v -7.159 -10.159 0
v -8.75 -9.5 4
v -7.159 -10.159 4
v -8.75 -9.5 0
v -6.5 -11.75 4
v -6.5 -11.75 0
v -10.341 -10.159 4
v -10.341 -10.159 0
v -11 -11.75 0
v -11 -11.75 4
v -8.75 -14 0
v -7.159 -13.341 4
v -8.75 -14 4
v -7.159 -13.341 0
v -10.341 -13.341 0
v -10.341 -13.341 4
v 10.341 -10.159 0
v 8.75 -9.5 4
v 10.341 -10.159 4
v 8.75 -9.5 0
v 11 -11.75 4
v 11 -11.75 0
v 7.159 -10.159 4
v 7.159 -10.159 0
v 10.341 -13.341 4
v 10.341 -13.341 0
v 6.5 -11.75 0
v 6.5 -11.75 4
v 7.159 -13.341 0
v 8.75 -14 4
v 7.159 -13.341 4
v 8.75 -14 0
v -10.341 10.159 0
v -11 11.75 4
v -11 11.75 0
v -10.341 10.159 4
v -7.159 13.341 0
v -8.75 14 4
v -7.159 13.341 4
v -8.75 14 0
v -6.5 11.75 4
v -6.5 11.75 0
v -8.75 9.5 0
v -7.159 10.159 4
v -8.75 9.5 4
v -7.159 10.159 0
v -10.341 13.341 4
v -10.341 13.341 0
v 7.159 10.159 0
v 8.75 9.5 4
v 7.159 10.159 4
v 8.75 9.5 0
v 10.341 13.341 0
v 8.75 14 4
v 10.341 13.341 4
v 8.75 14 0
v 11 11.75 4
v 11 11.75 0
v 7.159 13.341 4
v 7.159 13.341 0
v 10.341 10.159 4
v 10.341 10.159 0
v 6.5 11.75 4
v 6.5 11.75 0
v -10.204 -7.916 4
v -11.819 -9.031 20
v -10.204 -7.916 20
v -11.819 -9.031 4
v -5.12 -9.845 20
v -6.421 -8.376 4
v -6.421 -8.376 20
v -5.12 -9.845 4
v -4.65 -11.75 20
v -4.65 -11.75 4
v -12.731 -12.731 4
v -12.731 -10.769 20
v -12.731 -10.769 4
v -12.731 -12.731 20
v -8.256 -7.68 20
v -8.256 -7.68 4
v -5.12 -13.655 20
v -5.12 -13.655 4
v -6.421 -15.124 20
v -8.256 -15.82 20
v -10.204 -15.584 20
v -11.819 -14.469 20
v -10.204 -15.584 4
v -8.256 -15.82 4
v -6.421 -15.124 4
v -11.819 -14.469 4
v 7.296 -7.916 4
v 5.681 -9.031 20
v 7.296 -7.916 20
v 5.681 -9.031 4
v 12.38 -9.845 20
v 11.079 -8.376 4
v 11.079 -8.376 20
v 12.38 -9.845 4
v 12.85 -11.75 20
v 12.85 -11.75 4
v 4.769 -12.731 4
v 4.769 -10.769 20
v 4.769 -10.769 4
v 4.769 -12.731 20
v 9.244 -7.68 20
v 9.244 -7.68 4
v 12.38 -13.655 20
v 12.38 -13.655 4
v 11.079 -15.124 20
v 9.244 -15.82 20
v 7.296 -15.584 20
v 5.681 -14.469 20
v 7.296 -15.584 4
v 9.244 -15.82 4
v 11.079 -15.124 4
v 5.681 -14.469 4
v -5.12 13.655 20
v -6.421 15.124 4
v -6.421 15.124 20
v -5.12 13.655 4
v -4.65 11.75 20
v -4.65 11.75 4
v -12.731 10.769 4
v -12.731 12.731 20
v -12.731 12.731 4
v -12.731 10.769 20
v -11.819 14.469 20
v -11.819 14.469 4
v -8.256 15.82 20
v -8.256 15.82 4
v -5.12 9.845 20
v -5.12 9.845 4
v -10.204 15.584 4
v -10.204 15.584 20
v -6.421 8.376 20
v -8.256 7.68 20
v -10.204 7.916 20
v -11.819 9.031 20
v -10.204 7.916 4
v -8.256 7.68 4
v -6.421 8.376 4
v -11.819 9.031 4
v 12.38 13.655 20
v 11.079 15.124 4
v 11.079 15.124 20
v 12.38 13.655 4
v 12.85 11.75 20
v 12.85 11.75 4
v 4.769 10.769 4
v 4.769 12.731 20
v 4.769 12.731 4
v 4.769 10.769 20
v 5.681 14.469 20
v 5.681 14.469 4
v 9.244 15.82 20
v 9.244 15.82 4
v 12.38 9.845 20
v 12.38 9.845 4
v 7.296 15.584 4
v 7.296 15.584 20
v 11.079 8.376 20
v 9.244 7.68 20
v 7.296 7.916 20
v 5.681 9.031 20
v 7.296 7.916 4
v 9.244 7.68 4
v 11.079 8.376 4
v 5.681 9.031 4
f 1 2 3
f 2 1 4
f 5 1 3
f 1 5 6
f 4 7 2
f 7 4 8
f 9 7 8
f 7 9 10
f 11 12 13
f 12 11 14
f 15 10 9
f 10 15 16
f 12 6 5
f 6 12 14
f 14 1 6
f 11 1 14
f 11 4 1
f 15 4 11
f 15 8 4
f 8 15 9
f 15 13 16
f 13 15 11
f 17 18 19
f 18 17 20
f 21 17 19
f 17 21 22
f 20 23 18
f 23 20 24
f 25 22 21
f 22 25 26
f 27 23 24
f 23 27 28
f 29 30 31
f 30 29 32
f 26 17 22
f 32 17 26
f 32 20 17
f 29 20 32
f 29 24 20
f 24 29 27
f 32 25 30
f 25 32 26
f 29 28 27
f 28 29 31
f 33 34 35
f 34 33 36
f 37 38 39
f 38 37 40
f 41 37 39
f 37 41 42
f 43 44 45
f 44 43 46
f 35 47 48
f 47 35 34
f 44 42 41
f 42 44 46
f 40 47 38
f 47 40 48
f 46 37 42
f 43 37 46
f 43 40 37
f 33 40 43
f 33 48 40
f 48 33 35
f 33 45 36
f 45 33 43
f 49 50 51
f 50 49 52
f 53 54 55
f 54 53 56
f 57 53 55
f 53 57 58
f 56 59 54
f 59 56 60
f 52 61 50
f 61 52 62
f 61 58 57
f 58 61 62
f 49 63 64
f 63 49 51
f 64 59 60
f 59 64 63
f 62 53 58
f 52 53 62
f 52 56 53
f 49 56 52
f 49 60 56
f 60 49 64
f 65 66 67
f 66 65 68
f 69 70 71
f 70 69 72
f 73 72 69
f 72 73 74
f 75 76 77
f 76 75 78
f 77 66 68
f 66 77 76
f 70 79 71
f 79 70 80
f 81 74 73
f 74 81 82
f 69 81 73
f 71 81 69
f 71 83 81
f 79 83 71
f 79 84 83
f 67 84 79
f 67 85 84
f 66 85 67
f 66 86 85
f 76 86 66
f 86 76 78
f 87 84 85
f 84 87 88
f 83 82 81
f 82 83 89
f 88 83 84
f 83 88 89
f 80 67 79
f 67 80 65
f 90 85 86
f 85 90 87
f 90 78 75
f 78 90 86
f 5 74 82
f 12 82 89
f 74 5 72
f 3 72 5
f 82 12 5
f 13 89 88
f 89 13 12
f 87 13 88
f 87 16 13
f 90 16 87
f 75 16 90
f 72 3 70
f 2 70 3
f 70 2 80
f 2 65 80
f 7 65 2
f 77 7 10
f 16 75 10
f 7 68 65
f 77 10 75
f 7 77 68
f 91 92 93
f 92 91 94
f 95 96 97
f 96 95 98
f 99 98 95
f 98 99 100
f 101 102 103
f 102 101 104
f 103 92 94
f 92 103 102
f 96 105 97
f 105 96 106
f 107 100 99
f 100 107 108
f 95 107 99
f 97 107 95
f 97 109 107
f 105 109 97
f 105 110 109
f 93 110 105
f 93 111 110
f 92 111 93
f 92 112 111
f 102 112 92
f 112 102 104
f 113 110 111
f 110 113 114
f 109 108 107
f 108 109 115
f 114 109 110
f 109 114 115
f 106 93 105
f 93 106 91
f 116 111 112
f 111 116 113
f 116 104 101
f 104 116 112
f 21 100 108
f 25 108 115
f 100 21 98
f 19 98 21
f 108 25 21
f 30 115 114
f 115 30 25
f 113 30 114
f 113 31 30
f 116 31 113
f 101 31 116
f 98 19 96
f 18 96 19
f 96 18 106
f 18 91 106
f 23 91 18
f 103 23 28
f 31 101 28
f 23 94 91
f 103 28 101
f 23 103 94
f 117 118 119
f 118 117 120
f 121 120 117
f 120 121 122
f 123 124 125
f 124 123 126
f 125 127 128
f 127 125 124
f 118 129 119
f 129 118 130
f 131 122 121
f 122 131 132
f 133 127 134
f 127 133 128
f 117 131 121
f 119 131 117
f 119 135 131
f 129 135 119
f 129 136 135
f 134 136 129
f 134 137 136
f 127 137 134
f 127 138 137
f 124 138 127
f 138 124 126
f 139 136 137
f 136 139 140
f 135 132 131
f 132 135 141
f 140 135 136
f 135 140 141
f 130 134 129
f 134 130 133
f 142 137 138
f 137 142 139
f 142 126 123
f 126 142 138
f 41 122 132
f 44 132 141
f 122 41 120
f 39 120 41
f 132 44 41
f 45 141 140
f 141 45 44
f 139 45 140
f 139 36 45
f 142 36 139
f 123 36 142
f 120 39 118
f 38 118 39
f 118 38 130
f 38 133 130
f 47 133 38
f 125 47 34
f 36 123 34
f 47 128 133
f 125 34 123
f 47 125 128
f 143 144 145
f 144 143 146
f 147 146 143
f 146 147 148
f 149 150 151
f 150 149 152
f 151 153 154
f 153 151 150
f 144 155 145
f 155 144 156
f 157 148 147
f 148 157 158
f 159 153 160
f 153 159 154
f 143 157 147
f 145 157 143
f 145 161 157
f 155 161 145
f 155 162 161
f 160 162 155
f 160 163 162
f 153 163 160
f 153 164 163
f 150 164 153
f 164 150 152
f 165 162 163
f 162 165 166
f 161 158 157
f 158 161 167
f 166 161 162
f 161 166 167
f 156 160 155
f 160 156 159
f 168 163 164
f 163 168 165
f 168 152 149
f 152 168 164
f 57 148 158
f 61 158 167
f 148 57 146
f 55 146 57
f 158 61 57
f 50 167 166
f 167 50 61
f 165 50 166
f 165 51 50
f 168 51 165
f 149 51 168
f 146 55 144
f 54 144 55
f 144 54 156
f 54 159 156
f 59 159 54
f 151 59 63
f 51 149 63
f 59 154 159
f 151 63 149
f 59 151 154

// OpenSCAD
// file: shared_variables.scad
// sled
sled_length = 29.5;
sled_width = 34.5;
sled_x_distance = 17.5;
sled_y_distance = 23.5;
sled_screw_hole_diameter = 4.5;
sled_screw_head_diameter = 8.2;
sled_screw_head_th = 3;

// nema 17 stepper motor
motor_width = 45;
motor_mount_height = 40;

// roundbar
axle_holder_width = 30;
axle_set_depth = 12;
roundbar_diameter = 8 + 0.6;
axle_mount_hole_center = (axle_holder_width - roundbar_diameter) / 4;
axle_fastener_height = 11;

// axle_bearing
bearing_diameter = 22;
bearing_thickness = 8;
bearing_mount_width = bearing_diameter + 16;

// general
y_axle_distance = 30;
bottom_th = 8;
wall_th = 8;
sled_clearing_distance = 10 + 2;
motor_backset = 30;
axle_height = 20;
motor_mount_width = motor_width / 2 + y_axle_distance + axle_holder_width / 2;
m3_hole_d = 3.8;
// main file
include <shared_variables.scad>

sled_negative();

module sled_negative() {
    translate([-sled_x_distance / 2, -sled_y_distance/2, 0])
        cylinder(d = sled_screw_hole_diameter, h = bottom_th);
    translate([sled_x_distance / 2, -sled_y_distance/2, 0])
        cylinder(d = sled_screw_hole_diameter, h = bottom_th);
    translate([-sled_x_distance / 2, sled_y_distance/2, 0])
        cylinder(d = sled_screw_hole_diameter, h = bottom_th);
    translate([sled_x_distance / 2, sled_y_distance/2, 0])
        cylinder(d = sled_screw_hole_diameter, h = bottom_th);

    translate([-sled_x_distance / 2, -sled_y_distance/2, 4])
        cylinder(d = sled_screw_head_diameter, h = motor_mount_height / 2 - 4);
    translate([sled_x_distance / 2, -sled_y_distance/2, 4])
        cylinder(d = sled_screw_head_diameter, h = motor_mount_height / 2 - 4);
    translate([-sled_x_distance / 2, sled_y_distance/2, 4])
        cylinder(d = sled_screw_head_diameter, h = motor_mount_height / 2 - 4);
    translate([sled_x_distance / 2, sled_y_distance/2, 4])
        cylinder(d = sled_screw_head_diameter, h = motor_mount_height / 2 - 4);
}
